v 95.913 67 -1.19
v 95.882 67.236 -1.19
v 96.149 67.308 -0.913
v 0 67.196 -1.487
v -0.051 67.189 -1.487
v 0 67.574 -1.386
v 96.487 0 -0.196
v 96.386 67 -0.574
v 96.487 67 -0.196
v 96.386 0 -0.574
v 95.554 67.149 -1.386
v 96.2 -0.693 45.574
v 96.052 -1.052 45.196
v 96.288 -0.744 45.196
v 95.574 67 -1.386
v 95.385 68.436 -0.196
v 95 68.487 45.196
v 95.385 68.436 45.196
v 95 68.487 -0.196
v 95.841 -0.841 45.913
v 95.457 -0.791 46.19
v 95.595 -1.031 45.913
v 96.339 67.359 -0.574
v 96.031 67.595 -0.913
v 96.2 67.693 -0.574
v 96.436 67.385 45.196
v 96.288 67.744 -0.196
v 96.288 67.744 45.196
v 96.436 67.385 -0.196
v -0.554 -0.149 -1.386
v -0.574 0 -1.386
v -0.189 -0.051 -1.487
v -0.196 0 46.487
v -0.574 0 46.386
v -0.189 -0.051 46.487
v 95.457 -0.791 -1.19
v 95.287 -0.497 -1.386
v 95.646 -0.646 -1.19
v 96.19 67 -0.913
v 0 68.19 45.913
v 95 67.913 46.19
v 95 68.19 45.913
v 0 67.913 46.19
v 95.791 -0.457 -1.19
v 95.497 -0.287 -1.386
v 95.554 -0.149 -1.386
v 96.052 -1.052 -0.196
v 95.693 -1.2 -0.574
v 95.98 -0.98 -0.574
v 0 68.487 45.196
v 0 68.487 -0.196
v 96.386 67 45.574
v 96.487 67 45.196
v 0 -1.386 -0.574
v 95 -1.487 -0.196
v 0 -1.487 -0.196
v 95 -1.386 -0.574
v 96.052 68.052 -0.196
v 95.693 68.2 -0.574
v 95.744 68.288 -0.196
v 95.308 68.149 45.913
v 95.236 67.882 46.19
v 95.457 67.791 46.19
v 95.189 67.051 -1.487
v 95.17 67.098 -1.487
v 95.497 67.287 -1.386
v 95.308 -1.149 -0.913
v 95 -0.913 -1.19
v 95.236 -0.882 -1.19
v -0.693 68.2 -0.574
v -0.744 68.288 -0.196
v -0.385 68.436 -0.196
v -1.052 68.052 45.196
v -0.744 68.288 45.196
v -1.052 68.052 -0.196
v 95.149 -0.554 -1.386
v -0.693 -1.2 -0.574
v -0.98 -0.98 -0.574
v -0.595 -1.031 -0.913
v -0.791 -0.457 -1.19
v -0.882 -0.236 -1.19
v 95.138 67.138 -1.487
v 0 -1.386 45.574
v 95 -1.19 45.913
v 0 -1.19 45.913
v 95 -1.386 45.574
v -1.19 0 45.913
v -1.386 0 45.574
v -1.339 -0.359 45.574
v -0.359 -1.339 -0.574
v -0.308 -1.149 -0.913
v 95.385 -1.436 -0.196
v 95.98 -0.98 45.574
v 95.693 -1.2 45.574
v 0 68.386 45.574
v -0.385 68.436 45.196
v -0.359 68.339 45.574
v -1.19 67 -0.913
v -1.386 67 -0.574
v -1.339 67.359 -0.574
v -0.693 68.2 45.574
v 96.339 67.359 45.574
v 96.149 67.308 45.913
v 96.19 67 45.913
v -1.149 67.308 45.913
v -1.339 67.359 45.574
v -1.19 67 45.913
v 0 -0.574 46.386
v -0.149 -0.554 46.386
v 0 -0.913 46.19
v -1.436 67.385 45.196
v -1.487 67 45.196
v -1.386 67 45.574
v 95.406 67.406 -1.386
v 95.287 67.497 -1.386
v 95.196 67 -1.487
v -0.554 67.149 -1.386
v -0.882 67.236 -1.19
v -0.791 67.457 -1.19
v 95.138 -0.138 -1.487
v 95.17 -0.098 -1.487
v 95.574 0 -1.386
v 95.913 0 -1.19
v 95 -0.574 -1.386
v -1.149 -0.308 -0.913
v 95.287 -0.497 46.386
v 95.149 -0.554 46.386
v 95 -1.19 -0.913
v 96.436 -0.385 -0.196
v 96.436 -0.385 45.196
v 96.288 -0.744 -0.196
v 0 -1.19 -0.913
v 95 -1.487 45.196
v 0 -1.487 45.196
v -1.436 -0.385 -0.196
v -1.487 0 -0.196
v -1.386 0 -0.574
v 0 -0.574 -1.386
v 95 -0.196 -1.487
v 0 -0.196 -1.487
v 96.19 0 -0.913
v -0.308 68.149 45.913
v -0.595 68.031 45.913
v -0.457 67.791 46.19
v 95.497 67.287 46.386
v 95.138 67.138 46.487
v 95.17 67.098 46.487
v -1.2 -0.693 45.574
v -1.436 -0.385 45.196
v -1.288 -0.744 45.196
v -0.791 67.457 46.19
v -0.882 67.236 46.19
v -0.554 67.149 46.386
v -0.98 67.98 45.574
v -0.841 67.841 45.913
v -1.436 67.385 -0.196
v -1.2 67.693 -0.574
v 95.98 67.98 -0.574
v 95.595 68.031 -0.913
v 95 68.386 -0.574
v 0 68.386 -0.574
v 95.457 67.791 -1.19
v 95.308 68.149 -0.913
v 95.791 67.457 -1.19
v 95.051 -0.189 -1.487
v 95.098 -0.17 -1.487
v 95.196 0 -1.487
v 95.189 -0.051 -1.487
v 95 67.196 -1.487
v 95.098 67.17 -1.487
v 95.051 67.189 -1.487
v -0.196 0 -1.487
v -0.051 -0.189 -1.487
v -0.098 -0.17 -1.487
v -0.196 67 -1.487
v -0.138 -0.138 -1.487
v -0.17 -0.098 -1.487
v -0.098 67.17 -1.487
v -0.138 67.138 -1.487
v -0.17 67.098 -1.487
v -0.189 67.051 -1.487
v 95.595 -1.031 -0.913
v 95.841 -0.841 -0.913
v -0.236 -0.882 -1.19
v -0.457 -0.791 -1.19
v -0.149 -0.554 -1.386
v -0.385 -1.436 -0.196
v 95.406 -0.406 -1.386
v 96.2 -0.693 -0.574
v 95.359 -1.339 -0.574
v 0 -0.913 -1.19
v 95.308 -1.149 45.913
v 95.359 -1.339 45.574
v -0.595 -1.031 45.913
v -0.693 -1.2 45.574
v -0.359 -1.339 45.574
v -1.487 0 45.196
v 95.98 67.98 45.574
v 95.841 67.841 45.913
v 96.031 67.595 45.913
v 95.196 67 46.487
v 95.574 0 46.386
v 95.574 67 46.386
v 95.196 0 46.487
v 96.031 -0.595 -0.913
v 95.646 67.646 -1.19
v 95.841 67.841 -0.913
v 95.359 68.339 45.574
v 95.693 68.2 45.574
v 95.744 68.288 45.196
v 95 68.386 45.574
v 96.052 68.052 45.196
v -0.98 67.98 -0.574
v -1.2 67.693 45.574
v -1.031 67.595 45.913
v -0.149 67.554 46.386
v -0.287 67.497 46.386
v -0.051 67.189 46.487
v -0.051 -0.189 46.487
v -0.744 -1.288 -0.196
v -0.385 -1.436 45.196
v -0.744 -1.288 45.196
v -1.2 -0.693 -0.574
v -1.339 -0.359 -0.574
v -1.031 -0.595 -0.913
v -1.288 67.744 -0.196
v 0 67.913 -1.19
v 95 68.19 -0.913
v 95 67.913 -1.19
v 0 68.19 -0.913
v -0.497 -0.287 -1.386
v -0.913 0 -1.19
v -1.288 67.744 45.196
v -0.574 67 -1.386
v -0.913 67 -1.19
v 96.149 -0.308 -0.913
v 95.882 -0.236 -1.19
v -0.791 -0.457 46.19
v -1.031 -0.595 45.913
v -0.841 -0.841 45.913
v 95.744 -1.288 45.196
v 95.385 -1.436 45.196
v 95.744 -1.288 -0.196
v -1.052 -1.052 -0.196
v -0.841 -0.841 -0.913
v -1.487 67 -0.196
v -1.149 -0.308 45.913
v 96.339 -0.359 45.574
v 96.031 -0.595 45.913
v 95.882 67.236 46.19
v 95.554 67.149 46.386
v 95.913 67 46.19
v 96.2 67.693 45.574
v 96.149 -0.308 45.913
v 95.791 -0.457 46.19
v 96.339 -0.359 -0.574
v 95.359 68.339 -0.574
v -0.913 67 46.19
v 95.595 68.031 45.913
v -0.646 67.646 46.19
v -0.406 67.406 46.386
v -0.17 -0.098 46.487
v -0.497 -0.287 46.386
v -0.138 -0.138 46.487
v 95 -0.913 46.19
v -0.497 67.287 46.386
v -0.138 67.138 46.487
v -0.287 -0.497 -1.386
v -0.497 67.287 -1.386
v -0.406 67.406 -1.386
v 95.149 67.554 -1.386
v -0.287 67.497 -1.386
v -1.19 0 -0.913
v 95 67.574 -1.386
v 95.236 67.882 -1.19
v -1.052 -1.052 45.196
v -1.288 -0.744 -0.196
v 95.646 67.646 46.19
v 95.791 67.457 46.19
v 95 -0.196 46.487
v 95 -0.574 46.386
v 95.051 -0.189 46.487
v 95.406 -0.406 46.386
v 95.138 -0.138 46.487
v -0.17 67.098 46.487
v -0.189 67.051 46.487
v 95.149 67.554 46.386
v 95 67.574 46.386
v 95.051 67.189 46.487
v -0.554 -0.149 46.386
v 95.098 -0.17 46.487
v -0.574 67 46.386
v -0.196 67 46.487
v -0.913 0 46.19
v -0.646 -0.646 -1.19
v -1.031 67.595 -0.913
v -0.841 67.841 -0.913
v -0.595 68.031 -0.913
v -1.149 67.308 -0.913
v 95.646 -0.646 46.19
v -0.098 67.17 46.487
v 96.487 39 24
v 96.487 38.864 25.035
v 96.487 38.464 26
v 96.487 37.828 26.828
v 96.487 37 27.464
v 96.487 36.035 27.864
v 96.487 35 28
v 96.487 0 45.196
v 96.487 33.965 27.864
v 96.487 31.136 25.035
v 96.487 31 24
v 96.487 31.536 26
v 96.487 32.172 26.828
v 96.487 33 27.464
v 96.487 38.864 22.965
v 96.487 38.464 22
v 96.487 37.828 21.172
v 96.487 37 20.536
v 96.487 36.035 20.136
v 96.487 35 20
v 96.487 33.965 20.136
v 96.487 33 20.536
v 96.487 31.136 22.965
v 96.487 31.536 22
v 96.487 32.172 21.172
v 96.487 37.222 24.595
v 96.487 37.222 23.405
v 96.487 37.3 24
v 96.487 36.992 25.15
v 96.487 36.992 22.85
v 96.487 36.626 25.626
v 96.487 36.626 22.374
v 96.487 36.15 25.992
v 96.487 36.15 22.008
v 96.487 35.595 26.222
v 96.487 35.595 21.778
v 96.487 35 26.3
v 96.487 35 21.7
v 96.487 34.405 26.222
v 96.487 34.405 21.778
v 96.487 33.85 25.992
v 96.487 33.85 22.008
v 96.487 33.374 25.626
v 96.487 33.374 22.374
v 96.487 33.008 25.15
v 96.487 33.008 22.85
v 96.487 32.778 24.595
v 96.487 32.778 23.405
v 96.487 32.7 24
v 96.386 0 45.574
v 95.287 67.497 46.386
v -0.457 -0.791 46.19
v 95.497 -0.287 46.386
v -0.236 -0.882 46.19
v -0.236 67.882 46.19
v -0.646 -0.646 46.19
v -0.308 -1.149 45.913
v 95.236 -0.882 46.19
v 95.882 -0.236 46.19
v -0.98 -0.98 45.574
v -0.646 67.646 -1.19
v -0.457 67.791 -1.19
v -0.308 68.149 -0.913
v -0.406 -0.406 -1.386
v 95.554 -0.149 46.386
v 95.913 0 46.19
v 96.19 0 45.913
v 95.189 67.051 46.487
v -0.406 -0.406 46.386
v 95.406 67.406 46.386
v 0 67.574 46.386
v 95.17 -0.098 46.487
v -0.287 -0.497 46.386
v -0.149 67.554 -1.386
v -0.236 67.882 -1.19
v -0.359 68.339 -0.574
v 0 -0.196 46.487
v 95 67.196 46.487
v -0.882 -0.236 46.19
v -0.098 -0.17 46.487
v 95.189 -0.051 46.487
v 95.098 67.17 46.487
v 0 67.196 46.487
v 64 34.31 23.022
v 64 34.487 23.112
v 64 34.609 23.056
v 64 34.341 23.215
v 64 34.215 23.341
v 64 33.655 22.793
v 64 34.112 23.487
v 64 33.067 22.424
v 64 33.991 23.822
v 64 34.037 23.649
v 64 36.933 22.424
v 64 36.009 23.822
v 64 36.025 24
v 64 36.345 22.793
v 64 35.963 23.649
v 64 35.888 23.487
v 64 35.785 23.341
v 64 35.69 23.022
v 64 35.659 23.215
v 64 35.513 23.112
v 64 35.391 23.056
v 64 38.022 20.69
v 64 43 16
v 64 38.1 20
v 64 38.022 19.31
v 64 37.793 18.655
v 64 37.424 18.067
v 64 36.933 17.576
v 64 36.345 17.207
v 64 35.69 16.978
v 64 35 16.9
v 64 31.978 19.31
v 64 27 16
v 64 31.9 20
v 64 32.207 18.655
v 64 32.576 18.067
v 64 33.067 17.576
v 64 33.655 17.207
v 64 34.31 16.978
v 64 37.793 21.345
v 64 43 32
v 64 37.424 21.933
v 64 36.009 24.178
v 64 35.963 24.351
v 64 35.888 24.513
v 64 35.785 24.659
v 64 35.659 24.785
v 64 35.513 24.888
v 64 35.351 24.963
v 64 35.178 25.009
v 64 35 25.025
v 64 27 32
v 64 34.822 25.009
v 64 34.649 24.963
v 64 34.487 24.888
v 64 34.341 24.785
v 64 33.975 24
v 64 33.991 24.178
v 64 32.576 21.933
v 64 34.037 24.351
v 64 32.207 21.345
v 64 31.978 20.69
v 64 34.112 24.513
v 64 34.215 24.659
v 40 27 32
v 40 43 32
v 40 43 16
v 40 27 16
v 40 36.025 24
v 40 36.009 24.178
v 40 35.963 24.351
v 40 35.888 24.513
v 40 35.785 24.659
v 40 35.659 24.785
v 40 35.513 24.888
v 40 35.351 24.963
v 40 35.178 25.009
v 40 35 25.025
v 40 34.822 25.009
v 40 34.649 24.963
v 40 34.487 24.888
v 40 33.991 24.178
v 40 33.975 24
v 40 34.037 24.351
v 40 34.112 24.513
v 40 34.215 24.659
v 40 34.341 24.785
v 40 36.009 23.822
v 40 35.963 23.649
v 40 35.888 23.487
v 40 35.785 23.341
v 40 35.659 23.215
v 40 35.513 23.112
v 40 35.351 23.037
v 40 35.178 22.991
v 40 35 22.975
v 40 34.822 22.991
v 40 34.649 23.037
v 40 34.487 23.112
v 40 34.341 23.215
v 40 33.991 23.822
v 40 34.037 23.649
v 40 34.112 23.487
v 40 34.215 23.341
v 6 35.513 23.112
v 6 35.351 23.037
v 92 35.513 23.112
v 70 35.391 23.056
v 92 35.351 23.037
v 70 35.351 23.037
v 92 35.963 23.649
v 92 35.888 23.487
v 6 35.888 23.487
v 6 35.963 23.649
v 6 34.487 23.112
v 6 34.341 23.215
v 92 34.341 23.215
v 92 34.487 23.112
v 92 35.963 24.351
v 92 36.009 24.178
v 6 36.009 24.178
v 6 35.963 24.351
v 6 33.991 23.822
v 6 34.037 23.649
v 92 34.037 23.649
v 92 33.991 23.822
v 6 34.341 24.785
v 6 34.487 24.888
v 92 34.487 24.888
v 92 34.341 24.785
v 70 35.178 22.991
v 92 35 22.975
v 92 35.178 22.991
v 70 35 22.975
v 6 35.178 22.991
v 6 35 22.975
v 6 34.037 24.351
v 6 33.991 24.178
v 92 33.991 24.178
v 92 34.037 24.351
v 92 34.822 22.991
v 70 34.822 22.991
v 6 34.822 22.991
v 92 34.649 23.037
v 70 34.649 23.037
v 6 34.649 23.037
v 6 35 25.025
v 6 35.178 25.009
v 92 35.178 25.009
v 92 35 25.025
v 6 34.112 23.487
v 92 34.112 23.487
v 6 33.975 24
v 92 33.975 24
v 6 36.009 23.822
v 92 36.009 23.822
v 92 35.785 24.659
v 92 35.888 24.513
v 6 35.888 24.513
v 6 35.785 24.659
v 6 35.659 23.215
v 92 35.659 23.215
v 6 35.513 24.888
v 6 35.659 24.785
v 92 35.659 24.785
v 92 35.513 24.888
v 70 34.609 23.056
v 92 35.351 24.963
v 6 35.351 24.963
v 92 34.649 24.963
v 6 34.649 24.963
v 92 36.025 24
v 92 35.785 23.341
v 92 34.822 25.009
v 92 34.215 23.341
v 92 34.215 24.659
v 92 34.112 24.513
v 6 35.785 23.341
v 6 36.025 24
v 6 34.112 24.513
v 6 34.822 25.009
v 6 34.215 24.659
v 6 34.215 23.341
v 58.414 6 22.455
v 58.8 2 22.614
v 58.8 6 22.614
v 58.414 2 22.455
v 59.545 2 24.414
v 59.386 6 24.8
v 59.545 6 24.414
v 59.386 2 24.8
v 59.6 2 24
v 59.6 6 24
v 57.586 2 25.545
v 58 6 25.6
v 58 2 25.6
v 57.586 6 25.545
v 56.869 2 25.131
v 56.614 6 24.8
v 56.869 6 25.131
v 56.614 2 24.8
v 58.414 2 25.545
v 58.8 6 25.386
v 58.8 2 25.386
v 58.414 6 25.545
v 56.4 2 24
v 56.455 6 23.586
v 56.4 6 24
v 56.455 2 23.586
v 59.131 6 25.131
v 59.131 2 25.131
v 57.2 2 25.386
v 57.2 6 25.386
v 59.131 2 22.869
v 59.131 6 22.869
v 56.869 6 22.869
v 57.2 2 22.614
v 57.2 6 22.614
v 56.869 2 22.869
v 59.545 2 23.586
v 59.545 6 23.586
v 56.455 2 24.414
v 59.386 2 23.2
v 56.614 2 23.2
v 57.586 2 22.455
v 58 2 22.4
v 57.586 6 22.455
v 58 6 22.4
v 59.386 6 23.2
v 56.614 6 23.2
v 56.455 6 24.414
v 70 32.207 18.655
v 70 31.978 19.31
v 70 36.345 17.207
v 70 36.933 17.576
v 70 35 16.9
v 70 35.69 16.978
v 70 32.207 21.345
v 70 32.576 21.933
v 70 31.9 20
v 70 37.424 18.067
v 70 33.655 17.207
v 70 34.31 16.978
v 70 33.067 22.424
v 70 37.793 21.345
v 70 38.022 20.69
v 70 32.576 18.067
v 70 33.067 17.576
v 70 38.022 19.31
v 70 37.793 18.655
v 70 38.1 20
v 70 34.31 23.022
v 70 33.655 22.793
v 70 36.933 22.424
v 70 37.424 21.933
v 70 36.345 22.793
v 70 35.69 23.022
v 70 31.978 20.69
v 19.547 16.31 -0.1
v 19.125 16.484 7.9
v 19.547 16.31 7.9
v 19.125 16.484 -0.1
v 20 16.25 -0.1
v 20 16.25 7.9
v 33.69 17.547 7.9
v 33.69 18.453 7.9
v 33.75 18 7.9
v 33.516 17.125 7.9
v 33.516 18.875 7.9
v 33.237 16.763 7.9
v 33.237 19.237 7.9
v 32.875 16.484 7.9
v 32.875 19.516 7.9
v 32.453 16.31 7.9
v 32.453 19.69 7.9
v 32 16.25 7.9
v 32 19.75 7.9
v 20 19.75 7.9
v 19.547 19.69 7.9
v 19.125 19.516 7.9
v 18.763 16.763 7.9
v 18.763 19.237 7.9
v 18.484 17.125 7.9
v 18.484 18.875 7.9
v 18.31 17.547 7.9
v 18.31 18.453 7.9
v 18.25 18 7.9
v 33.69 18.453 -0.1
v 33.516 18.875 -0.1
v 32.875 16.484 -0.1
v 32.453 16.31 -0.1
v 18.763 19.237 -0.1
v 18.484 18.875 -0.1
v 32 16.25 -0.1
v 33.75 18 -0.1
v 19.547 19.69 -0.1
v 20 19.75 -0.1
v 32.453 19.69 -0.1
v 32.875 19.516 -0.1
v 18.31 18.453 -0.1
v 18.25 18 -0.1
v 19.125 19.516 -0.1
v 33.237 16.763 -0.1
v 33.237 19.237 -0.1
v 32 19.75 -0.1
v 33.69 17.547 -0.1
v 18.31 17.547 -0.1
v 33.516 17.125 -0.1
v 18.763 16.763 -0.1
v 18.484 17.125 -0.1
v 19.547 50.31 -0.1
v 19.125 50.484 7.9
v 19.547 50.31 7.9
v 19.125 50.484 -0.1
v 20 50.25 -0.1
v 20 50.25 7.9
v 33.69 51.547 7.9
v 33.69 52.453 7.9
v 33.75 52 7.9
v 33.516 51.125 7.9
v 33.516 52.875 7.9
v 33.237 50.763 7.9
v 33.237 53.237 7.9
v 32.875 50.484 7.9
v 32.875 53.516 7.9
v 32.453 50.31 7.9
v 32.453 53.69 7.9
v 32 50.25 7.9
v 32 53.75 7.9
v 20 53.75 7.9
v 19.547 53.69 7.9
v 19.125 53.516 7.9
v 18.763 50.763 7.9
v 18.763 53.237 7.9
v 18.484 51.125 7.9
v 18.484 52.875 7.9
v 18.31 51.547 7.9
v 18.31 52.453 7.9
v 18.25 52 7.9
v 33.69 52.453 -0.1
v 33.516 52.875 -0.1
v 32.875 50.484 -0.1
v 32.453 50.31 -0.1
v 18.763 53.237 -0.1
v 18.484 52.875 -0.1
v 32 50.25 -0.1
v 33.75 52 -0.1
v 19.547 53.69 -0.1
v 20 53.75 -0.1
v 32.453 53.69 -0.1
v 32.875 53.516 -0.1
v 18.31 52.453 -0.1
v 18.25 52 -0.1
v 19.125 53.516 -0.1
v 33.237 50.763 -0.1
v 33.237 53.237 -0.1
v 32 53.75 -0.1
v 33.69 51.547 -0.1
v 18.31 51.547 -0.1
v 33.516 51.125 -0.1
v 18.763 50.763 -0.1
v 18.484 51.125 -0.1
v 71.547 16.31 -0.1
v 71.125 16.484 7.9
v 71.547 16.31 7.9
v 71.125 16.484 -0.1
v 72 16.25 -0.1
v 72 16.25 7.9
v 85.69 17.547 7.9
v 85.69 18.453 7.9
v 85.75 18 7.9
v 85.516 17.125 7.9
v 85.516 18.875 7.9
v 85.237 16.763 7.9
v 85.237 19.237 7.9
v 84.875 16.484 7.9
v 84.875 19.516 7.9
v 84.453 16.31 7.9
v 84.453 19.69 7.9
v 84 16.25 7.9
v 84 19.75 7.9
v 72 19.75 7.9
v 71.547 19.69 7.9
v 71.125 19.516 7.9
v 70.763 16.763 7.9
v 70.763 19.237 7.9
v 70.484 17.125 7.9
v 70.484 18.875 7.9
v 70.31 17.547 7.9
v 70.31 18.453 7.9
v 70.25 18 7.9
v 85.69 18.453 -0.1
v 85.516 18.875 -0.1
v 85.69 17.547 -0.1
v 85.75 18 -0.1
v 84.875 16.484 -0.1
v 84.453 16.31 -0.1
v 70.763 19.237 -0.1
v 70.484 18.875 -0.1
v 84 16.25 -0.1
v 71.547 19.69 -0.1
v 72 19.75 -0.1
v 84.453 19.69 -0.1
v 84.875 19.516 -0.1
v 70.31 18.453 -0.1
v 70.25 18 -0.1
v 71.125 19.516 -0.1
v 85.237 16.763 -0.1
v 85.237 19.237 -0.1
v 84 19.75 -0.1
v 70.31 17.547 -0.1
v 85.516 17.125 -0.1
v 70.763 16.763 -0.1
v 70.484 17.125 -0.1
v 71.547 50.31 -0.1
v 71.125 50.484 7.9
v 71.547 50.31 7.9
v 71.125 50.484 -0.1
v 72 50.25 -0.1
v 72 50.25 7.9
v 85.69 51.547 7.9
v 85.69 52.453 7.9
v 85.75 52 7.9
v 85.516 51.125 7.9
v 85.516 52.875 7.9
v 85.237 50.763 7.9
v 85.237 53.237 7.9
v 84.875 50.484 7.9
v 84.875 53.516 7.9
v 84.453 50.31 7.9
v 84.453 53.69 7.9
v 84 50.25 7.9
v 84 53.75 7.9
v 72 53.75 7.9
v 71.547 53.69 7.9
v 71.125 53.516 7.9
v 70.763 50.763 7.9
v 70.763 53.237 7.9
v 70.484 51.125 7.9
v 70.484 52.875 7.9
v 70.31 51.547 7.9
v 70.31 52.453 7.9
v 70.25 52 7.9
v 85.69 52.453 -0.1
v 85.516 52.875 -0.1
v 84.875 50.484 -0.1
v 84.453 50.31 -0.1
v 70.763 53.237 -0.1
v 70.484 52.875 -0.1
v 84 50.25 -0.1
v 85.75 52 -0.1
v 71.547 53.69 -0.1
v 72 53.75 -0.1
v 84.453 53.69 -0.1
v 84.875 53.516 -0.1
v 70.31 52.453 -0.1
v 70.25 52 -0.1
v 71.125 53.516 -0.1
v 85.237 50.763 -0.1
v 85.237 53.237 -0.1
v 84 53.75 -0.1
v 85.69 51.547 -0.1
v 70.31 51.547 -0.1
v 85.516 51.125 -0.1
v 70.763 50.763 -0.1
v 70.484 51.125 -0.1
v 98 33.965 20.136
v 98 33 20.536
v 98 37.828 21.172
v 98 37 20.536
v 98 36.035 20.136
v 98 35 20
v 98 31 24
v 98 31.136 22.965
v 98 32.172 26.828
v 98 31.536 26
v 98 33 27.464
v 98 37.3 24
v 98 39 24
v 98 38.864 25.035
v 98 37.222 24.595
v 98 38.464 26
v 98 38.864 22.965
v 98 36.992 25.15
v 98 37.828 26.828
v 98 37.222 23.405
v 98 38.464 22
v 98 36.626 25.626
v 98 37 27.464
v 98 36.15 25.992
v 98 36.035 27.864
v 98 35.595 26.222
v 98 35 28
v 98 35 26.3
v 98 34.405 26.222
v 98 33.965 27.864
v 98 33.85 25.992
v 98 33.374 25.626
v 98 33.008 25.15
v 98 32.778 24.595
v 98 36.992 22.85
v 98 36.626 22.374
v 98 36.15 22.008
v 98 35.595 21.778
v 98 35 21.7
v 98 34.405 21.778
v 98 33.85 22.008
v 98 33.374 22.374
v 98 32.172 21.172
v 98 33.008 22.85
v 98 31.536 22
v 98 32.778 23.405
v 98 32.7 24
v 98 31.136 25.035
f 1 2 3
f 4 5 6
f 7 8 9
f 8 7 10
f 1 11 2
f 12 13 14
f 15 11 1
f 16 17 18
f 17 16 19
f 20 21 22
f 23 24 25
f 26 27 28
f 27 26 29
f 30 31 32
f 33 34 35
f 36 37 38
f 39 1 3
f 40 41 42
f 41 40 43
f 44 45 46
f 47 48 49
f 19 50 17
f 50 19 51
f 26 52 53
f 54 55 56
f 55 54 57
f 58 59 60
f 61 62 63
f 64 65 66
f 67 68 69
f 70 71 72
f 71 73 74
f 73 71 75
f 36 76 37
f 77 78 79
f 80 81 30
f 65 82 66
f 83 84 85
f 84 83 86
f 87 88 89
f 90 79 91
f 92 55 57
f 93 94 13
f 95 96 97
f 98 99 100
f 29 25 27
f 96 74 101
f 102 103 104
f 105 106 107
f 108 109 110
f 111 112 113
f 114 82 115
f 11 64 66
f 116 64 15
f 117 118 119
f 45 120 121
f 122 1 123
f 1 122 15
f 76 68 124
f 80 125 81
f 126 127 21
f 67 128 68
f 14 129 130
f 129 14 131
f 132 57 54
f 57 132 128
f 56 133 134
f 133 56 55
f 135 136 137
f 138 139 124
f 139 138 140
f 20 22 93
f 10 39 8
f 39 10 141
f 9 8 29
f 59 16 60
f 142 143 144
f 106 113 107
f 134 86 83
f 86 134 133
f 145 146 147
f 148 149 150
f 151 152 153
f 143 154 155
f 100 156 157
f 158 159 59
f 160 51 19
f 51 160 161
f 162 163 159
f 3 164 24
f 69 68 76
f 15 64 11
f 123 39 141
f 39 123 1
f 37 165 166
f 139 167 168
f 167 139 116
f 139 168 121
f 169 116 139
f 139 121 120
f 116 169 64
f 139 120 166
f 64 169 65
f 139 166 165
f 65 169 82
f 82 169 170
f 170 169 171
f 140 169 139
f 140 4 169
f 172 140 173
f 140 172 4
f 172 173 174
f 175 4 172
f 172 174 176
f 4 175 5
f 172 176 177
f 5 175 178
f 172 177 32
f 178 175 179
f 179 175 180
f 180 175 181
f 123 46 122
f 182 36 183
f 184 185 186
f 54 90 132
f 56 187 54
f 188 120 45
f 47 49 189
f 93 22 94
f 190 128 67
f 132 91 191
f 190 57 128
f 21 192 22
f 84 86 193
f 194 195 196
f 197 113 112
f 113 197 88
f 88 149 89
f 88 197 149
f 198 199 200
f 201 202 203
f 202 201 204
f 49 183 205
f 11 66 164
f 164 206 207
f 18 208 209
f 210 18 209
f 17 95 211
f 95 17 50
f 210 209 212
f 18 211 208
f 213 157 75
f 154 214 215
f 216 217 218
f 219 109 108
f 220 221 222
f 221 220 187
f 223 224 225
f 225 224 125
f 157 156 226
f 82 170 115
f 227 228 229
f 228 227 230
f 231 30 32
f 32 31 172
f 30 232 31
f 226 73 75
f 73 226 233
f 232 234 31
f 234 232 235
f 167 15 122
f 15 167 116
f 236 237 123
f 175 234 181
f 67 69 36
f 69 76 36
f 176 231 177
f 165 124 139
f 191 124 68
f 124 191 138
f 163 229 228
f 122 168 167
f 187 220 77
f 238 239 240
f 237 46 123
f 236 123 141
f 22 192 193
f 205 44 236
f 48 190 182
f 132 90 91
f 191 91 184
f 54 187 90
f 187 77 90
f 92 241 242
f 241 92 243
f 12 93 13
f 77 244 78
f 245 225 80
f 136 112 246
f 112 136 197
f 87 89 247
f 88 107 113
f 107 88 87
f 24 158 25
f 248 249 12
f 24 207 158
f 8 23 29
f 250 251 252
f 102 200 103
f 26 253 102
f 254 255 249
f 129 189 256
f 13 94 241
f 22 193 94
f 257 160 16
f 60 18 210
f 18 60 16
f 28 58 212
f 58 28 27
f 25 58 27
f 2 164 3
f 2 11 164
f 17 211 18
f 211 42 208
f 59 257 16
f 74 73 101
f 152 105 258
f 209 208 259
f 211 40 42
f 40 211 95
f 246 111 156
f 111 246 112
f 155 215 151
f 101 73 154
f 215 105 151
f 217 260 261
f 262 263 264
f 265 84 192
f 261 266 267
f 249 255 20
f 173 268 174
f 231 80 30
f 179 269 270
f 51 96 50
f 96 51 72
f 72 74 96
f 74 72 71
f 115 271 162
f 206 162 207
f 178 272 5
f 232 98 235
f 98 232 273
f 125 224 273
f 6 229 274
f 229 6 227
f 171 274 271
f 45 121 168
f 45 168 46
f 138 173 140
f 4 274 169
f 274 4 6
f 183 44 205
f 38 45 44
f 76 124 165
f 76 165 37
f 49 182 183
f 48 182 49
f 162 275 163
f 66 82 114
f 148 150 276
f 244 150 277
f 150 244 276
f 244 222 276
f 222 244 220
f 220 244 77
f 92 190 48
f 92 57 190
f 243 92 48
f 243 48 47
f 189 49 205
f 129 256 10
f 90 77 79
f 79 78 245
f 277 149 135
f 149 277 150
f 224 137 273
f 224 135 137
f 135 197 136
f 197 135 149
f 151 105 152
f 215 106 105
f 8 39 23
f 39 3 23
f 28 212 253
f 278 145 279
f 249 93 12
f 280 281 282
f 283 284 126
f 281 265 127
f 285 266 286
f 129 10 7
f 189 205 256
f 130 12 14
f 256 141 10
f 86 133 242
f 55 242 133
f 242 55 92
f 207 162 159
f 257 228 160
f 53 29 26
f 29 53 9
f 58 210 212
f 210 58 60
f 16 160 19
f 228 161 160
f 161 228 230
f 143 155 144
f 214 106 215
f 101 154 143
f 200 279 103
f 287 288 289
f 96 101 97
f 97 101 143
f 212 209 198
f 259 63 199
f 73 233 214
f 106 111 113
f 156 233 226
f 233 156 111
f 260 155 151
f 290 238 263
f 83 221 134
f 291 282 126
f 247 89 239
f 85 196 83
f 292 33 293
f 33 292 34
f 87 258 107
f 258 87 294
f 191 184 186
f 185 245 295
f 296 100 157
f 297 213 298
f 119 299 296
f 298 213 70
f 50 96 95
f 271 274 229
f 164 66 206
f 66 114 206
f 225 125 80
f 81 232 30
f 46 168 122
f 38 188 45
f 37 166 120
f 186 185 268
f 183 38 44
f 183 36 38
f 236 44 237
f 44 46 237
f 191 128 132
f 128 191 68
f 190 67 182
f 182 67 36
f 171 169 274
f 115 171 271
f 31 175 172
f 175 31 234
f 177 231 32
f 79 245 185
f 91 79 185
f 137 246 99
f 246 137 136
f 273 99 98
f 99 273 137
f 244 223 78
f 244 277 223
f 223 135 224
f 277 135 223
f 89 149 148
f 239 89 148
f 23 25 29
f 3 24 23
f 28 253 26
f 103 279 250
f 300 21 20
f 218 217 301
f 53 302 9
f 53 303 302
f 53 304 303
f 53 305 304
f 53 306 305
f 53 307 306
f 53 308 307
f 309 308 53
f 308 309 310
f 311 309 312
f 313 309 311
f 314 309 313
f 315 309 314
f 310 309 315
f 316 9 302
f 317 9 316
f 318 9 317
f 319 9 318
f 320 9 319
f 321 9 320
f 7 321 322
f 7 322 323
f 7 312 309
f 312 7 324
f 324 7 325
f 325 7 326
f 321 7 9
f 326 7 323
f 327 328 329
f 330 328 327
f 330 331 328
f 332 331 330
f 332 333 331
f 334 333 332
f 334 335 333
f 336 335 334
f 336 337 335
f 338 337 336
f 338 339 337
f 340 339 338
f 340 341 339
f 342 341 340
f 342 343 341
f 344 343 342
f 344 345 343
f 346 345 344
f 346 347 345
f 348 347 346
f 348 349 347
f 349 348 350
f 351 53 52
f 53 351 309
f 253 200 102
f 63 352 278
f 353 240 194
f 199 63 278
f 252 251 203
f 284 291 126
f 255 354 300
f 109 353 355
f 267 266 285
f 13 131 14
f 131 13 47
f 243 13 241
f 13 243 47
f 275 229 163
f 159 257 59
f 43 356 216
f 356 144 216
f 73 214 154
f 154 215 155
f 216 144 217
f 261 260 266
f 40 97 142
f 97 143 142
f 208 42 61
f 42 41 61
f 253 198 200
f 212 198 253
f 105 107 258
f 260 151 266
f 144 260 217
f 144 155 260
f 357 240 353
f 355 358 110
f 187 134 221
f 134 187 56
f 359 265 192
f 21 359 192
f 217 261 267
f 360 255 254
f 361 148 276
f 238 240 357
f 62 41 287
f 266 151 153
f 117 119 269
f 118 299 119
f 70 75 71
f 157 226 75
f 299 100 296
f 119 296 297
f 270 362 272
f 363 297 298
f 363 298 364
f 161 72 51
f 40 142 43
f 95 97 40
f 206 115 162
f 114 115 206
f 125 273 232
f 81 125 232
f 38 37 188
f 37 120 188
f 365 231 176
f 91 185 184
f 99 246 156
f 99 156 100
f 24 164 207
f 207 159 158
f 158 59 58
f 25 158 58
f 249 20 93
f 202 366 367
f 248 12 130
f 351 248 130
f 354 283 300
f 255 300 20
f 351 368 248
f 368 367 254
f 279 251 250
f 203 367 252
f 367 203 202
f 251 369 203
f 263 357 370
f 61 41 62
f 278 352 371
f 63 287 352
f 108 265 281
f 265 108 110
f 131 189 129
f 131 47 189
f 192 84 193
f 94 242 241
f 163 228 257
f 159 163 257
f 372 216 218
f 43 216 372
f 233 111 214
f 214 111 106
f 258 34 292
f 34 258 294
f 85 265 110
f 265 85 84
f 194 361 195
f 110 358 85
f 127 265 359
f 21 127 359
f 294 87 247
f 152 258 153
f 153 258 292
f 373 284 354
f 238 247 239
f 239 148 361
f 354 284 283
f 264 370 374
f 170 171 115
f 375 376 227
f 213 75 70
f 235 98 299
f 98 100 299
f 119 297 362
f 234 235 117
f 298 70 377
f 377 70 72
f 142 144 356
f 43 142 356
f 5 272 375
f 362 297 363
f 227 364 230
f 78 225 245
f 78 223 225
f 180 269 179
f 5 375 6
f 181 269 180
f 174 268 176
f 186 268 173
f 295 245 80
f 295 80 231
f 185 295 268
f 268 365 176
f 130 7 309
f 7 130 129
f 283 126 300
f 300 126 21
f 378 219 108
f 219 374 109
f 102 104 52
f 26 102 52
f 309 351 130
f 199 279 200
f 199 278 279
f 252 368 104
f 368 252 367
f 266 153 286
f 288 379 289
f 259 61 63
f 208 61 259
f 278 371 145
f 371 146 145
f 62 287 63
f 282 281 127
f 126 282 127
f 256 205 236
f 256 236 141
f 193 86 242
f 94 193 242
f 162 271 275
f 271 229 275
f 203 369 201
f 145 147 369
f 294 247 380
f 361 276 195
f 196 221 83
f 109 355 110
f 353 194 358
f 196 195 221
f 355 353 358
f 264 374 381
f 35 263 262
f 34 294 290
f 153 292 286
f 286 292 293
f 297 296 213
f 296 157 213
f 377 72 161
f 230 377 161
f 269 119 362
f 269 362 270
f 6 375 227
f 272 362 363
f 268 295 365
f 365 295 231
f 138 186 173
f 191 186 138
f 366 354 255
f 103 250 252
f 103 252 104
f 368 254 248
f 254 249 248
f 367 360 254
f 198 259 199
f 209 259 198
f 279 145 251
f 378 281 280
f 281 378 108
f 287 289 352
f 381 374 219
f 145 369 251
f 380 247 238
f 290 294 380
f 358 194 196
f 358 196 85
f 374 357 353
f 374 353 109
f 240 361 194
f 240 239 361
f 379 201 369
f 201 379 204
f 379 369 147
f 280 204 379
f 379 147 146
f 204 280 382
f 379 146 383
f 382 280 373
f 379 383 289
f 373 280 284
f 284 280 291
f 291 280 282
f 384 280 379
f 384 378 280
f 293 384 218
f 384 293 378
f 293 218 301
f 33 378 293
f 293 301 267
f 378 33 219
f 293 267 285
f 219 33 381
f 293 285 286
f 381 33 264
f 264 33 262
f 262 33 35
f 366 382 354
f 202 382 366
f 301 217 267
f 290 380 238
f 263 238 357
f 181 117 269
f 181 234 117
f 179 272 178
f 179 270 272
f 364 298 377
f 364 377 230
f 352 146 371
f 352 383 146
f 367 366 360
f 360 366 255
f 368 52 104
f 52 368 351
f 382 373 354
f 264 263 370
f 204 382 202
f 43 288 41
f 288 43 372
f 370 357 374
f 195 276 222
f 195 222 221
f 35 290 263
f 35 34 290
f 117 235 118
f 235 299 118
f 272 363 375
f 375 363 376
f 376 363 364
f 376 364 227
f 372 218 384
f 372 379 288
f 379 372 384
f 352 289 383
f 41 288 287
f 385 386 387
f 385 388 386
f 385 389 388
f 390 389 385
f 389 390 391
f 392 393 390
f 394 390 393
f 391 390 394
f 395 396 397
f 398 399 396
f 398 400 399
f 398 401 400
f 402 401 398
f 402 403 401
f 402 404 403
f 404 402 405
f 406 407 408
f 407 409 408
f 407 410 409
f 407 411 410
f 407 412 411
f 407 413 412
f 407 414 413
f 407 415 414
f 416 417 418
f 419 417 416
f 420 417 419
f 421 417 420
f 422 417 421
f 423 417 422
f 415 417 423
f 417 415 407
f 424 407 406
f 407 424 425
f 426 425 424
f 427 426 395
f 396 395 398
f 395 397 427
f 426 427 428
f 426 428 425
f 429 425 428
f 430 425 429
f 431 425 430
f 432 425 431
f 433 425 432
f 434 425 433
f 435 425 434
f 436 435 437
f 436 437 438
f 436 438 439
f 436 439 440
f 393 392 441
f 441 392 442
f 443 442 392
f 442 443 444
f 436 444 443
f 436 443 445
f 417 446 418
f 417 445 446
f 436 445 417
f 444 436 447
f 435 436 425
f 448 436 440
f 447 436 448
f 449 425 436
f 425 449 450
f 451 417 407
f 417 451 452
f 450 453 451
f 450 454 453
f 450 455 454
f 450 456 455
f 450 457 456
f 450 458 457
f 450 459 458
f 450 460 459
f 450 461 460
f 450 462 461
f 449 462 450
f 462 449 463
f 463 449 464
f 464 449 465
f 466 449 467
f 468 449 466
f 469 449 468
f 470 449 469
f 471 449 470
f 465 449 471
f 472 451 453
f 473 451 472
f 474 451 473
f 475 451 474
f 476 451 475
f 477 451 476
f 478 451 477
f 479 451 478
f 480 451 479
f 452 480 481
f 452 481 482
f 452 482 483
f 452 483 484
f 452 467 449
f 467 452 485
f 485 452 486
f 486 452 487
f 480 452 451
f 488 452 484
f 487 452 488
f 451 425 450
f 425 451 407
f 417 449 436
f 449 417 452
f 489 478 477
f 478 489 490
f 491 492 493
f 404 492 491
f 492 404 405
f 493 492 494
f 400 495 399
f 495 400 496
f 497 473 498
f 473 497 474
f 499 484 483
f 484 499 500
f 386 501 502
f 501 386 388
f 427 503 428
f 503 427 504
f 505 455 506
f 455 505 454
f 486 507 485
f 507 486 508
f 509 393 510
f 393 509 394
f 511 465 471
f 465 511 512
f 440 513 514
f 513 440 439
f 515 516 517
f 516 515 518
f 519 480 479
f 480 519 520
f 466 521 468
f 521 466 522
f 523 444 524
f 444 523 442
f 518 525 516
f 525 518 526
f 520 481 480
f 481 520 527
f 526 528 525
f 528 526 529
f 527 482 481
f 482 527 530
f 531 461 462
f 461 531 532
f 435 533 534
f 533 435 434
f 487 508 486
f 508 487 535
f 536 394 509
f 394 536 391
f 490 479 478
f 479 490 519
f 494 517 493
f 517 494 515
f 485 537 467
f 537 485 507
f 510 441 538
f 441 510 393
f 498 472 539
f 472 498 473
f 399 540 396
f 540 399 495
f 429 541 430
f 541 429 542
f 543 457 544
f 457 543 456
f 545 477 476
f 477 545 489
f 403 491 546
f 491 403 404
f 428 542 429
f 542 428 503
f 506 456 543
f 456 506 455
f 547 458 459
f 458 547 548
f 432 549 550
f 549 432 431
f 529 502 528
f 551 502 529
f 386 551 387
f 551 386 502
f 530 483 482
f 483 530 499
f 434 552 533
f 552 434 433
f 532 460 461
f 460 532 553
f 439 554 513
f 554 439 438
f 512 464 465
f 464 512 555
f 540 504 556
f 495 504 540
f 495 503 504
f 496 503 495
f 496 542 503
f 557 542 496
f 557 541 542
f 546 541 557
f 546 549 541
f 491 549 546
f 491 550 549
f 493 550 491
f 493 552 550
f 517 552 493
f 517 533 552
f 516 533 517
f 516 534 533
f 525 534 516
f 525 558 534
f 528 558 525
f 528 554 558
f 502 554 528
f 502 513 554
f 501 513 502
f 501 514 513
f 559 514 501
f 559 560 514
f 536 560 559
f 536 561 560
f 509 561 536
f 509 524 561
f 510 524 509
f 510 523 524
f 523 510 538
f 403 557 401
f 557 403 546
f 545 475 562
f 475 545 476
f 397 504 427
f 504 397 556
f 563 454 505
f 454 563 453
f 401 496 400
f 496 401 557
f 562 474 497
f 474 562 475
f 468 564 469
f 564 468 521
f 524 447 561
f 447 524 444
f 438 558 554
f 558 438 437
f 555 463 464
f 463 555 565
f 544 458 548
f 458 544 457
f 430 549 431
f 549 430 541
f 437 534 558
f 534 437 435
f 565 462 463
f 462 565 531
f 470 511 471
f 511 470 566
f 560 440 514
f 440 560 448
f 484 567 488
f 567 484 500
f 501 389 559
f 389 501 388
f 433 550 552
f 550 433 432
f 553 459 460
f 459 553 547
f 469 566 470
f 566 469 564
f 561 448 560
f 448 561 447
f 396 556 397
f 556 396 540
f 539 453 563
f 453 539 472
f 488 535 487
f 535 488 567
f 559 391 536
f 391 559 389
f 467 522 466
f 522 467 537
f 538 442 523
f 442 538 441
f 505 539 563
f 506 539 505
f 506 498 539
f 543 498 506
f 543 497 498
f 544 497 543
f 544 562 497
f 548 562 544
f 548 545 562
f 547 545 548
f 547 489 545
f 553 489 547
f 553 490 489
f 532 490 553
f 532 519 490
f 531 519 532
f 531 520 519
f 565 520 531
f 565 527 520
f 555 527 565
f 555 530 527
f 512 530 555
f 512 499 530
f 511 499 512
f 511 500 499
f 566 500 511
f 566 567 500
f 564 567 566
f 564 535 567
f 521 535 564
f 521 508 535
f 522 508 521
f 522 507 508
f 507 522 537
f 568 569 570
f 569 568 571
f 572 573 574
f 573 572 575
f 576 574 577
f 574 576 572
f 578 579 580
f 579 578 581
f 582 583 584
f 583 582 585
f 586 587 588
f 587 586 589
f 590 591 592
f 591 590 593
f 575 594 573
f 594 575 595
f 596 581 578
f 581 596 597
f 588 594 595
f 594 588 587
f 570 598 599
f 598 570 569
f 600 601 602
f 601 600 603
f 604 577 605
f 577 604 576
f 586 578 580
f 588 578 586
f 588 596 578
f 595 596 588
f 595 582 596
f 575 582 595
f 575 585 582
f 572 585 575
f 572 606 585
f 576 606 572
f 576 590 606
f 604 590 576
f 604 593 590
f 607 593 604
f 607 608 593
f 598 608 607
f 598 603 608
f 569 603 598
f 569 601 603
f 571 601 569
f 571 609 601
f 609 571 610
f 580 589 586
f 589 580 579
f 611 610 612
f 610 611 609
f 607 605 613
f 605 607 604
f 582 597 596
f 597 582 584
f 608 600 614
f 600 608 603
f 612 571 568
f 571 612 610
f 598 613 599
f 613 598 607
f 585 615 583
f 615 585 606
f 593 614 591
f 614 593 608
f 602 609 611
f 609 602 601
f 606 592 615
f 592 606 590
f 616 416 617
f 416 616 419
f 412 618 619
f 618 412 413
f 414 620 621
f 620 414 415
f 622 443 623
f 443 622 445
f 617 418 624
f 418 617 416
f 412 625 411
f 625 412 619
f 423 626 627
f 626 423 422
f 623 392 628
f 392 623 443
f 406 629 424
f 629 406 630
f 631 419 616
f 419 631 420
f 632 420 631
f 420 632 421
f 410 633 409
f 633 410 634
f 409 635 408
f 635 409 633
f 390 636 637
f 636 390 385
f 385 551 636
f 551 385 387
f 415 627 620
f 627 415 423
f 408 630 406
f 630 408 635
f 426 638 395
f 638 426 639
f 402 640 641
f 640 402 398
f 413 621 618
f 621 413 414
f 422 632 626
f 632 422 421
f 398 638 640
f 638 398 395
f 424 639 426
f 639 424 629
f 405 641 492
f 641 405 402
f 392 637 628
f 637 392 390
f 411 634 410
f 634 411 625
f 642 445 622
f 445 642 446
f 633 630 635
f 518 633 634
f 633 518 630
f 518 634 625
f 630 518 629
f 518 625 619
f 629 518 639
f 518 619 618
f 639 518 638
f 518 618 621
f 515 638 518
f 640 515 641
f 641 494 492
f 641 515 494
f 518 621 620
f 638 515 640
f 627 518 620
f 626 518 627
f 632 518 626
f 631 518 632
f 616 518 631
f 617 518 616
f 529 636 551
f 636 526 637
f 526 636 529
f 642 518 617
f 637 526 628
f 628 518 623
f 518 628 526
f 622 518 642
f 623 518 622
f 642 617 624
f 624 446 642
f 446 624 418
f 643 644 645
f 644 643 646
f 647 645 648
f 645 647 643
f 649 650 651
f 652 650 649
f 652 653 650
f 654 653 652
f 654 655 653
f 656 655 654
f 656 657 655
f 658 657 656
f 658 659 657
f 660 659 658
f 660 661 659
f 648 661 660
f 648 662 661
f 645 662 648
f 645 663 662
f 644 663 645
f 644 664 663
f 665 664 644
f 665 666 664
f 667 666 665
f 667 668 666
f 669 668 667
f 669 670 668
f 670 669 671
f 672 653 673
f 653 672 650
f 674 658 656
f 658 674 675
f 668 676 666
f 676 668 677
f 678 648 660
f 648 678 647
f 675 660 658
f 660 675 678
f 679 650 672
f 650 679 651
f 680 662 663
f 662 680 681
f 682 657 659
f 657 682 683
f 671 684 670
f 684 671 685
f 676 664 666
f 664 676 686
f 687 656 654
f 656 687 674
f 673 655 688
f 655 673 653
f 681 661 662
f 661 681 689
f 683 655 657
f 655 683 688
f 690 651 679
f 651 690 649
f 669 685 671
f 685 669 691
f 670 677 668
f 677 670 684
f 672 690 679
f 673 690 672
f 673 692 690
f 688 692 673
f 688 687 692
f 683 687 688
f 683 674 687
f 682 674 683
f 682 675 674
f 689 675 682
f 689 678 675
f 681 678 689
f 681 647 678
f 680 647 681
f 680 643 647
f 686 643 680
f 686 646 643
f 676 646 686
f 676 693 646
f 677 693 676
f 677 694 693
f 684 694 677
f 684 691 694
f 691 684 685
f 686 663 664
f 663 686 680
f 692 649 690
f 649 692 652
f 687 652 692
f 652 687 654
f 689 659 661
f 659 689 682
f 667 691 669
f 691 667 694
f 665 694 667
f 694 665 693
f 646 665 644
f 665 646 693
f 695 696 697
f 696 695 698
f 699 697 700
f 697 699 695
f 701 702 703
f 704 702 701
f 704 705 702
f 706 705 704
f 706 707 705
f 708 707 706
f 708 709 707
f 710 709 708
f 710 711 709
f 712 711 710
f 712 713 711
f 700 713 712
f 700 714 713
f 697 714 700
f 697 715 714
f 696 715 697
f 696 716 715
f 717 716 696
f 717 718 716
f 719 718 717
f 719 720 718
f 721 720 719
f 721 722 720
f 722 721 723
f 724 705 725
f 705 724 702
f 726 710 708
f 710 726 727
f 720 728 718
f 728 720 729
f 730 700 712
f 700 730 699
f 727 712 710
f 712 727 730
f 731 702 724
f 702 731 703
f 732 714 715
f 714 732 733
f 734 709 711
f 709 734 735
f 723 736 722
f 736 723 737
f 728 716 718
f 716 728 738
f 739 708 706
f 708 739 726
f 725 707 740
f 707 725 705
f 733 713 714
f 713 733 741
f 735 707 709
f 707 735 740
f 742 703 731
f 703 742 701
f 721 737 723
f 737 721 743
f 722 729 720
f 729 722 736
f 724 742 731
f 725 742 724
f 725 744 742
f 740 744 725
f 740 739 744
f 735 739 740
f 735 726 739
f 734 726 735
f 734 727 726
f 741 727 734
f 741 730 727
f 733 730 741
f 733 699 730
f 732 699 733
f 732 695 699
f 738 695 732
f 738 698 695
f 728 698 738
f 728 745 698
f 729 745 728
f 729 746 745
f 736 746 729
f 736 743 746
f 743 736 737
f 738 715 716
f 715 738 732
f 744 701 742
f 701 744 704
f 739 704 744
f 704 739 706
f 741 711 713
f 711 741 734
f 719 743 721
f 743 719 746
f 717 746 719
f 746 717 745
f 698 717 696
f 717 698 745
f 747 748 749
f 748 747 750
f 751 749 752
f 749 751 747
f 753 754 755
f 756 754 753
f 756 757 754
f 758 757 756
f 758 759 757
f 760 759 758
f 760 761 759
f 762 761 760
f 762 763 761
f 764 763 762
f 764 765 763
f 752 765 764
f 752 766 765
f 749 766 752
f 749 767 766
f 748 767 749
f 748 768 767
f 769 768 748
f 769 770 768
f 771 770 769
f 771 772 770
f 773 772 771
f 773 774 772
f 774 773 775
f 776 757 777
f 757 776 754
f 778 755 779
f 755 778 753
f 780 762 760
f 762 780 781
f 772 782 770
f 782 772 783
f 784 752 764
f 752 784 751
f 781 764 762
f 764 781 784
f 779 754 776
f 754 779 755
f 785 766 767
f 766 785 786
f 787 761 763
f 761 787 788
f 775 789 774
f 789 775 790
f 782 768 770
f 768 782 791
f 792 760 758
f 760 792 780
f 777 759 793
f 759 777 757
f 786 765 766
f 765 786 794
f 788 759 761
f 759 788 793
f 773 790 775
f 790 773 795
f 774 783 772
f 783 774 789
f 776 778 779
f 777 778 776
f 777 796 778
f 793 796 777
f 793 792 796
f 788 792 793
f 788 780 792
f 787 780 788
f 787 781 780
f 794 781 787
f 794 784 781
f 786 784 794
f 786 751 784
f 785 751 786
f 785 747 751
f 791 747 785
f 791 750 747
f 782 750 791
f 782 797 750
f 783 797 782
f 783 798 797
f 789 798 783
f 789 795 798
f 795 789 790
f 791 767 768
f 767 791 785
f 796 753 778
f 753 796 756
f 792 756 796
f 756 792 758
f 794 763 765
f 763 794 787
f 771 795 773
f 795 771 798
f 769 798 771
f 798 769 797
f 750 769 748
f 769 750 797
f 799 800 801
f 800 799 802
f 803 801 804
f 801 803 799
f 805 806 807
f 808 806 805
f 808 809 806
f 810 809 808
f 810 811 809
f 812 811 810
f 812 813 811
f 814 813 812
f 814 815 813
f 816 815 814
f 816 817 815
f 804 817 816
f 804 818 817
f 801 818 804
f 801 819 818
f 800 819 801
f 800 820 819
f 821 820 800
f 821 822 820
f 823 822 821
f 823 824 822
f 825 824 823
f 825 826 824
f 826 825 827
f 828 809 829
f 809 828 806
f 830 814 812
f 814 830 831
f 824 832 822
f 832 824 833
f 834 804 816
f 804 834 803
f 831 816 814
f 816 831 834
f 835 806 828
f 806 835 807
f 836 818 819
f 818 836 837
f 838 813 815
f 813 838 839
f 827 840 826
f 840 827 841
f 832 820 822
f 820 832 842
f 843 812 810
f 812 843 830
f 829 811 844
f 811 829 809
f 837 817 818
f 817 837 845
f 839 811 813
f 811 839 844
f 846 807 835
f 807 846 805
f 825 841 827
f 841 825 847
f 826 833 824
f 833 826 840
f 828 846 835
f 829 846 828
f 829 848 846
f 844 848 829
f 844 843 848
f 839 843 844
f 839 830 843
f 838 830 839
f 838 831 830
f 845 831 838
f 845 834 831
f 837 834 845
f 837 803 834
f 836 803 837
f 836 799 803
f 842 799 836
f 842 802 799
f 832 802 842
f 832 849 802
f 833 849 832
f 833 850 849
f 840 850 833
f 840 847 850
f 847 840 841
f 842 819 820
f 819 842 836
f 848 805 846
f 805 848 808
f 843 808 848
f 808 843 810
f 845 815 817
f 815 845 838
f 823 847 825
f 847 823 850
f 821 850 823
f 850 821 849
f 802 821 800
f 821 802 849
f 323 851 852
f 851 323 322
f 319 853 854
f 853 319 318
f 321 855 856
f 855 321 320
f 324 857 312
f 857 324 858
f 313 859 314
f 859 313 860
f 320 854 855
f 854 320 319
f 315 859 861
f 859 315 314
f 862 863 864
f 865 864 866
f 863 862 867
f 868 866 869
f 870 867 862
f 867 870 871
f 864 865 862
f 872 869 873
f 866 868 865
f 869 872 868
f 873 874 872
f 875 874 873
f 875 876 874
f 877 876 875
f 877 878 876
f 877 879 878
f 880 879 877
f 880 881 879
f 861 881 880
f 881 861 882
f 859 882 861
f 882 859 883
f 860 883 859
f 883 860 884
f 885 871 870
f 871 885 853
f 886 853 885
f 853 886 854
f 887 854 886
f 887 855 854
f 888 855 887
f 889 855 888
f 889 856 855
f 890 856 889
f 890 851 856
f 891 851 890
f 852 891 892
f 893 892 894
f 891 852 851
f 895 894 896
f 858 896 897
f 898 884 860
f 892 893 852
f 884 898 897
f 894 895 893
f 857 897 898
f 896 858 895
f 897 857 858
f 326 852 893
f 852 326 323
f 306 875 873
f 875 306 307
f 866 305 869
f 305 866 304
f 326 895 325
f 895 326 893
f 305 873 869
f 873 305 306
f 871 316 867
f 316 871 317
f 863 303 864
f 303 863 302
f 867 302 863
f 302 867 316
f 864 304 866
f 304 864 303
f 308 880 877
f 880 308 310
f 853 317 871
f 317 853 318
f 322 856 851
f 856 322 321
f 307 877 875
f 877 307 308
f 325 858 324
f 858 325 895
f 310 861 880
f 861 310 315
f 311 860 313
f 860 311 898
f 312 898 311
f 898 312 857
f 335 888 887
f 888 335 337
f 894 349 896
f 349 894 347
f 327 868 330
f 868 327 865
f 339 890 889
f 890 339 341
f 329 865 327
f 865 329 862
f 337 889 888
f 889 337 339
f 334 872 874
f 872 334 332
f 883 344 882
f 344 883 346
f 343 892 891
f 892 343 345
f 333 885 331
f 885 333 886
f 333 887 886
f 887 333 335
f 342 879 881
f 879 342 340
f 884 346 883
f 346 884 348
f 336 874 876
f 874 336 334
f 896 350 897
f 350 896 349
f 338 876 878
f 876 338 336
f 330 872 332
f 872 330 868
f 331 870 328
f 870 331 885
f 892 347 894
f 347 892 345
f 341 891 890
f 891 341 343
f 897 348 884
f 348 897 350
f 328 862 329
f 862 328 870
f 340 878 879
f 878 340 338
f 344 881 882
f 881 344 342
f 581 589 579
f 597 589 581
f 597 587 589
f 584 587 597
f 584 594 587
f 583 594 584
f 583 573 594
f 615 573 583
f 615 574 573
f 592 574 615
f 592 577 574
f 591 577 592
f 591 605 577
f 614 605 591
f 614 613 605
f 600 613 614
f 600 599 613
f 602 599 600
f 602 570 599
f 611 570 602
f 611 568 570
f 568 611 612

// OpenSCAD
// file: common.scad
// Shared constants and primitives for F1.1 mechanical design.

filament_diameter = 1.75;
ptfe_inner_diameter = 2.0;
mount_hole_diameter = 3.2;
mount_slot_width = 3.5;
mount_slot_length = 10.0;

module rounded_block(size_vec, radius = 2) {
    x = size_vec[0];
    y = size_vec[1];
    z = size_vec[2];

    minkowski() {
        cube([x - (2 * radius), y - (2 * radius), z - (2 * radius)], center = false);
        sphere(r = radius, $fn = 24);
    }
}

module m3_hole(height = 12, diameter = mount_hole_diameter) {
    cylinder(h = height, d = diameter, center = false, $fn = 32);
}

module slot_hole(length = mount_slot_length, width = mount_slot_width, height = 8) {
    hull() {
        translate([0, 0, 0]) {
            cylinder(h = height, d = width, center = false, $fn = 24);
        }
        translate([length, 0, 0]) {
            cylinder(h = height, d = width, center = false, $fn = 24);
        }
    }
}

module filament_channel(length = 30, diameter = ptfe_inner_diameter, axis = "x") {
    if (axis == "x") {
        rotate([0, 90, 0]) {
            cylinder(h = length, d = diameter, center = true, $fn = 36);
        }
    } else if (axis == "y") {
        rotate([90, 0, 0]) {
            cylinder(h = length, d = diameter, center = true, $fn = 36);
        }
    } else {
        cylinder(h = length, d = diameter, center = true, $fn = 36);
    }
}

module pc4_m6_fitting_port() {
    difference() {
        cylinder(h = 8, d = 8, center = false, $fn = 24);
        translate([0, 0, -0.5]) {
            cylinder(h = 9, d = 4.6, center = false, $fn = 24);
        }
    }
}

module modular_rail(width = 80, depth = 12, length = 210) {
    difference() {
        cube([length, width, depth], center = false);

        for (slot_x = [15 : 20 : length - 15]) {
            translate([slot_x, width * 0.5, 0]) {
                slot_hole(length = mount_slot_length, width = mount_slot_width, height = depth + 1);
            }
        }
    }
}
// main file
use <common.scad>;

// Heated splice chamber station around repurposed hotend core.

module splice_chamber_station() {
    difference() {
        rounded_block([98, 70, 48], radius = 1.5);

        // Heater block pocket (16x16x12mm) with service clearance.
        translate([40, 27, 16]) {
            cube([24, 16, 16], center = false);
        }

        // PTFE constrained channel through hot zone.
        translate([49, 35, 24]) {
            filament_channel(length = 86, diameter = 2.05, axis = "x");
        }

        // Thermistor service bore.
        translate([58, 16, 24]) {
            rotate([90, 0, 0]) {
                cylinder(h = 14, d = 3.2, center = false, $fn = 24);
            }
        }

        // Heater cartridge bore.
        translate([44, 35, 20]) {
            rotate([0, 90, 0]) {
                cylinder(h = 26, d = 6.2, center = false, $fn = 28);
            }
        }

        // Rail slots for maintenance removal.
        translate([20, 18, -0.1]) {
            slot_hole(length = 12, width = 3.5, height = 8);
        }
        translate([20, 52, -0.1]) {
            slot_hole(length = 12, width = 3.5, height = 8);
        }
        translate([72, 18, -0.1]) {
            slot_hole(length = 12, width = 3.5, height = 8);
        }
        translate([72, 52, -0.1]) {
            slot_hole(length = 12, width = 3.5, height = 8);
        }
    }

    // Entry and exit guide bosses.
    translate([8, 35, 24]) {
        rotate([0, 90, 0]) {
            pc4_m6_fitting_port();
        }
    }

    translate([90, 35, 24]) {
        rotate([0, 90, 0]) {
            pc4_m6_fitting_port();
        }
    }

    // Clamp ears for hotend retention screws.
    translate([34, 6, 14]) {
        cube([8, 10, 20], center = false);
    }
    translate([56, 6, 14]) {
        cube([8, 10, 20], center = false);
    }
}

splice_chamber_station();
